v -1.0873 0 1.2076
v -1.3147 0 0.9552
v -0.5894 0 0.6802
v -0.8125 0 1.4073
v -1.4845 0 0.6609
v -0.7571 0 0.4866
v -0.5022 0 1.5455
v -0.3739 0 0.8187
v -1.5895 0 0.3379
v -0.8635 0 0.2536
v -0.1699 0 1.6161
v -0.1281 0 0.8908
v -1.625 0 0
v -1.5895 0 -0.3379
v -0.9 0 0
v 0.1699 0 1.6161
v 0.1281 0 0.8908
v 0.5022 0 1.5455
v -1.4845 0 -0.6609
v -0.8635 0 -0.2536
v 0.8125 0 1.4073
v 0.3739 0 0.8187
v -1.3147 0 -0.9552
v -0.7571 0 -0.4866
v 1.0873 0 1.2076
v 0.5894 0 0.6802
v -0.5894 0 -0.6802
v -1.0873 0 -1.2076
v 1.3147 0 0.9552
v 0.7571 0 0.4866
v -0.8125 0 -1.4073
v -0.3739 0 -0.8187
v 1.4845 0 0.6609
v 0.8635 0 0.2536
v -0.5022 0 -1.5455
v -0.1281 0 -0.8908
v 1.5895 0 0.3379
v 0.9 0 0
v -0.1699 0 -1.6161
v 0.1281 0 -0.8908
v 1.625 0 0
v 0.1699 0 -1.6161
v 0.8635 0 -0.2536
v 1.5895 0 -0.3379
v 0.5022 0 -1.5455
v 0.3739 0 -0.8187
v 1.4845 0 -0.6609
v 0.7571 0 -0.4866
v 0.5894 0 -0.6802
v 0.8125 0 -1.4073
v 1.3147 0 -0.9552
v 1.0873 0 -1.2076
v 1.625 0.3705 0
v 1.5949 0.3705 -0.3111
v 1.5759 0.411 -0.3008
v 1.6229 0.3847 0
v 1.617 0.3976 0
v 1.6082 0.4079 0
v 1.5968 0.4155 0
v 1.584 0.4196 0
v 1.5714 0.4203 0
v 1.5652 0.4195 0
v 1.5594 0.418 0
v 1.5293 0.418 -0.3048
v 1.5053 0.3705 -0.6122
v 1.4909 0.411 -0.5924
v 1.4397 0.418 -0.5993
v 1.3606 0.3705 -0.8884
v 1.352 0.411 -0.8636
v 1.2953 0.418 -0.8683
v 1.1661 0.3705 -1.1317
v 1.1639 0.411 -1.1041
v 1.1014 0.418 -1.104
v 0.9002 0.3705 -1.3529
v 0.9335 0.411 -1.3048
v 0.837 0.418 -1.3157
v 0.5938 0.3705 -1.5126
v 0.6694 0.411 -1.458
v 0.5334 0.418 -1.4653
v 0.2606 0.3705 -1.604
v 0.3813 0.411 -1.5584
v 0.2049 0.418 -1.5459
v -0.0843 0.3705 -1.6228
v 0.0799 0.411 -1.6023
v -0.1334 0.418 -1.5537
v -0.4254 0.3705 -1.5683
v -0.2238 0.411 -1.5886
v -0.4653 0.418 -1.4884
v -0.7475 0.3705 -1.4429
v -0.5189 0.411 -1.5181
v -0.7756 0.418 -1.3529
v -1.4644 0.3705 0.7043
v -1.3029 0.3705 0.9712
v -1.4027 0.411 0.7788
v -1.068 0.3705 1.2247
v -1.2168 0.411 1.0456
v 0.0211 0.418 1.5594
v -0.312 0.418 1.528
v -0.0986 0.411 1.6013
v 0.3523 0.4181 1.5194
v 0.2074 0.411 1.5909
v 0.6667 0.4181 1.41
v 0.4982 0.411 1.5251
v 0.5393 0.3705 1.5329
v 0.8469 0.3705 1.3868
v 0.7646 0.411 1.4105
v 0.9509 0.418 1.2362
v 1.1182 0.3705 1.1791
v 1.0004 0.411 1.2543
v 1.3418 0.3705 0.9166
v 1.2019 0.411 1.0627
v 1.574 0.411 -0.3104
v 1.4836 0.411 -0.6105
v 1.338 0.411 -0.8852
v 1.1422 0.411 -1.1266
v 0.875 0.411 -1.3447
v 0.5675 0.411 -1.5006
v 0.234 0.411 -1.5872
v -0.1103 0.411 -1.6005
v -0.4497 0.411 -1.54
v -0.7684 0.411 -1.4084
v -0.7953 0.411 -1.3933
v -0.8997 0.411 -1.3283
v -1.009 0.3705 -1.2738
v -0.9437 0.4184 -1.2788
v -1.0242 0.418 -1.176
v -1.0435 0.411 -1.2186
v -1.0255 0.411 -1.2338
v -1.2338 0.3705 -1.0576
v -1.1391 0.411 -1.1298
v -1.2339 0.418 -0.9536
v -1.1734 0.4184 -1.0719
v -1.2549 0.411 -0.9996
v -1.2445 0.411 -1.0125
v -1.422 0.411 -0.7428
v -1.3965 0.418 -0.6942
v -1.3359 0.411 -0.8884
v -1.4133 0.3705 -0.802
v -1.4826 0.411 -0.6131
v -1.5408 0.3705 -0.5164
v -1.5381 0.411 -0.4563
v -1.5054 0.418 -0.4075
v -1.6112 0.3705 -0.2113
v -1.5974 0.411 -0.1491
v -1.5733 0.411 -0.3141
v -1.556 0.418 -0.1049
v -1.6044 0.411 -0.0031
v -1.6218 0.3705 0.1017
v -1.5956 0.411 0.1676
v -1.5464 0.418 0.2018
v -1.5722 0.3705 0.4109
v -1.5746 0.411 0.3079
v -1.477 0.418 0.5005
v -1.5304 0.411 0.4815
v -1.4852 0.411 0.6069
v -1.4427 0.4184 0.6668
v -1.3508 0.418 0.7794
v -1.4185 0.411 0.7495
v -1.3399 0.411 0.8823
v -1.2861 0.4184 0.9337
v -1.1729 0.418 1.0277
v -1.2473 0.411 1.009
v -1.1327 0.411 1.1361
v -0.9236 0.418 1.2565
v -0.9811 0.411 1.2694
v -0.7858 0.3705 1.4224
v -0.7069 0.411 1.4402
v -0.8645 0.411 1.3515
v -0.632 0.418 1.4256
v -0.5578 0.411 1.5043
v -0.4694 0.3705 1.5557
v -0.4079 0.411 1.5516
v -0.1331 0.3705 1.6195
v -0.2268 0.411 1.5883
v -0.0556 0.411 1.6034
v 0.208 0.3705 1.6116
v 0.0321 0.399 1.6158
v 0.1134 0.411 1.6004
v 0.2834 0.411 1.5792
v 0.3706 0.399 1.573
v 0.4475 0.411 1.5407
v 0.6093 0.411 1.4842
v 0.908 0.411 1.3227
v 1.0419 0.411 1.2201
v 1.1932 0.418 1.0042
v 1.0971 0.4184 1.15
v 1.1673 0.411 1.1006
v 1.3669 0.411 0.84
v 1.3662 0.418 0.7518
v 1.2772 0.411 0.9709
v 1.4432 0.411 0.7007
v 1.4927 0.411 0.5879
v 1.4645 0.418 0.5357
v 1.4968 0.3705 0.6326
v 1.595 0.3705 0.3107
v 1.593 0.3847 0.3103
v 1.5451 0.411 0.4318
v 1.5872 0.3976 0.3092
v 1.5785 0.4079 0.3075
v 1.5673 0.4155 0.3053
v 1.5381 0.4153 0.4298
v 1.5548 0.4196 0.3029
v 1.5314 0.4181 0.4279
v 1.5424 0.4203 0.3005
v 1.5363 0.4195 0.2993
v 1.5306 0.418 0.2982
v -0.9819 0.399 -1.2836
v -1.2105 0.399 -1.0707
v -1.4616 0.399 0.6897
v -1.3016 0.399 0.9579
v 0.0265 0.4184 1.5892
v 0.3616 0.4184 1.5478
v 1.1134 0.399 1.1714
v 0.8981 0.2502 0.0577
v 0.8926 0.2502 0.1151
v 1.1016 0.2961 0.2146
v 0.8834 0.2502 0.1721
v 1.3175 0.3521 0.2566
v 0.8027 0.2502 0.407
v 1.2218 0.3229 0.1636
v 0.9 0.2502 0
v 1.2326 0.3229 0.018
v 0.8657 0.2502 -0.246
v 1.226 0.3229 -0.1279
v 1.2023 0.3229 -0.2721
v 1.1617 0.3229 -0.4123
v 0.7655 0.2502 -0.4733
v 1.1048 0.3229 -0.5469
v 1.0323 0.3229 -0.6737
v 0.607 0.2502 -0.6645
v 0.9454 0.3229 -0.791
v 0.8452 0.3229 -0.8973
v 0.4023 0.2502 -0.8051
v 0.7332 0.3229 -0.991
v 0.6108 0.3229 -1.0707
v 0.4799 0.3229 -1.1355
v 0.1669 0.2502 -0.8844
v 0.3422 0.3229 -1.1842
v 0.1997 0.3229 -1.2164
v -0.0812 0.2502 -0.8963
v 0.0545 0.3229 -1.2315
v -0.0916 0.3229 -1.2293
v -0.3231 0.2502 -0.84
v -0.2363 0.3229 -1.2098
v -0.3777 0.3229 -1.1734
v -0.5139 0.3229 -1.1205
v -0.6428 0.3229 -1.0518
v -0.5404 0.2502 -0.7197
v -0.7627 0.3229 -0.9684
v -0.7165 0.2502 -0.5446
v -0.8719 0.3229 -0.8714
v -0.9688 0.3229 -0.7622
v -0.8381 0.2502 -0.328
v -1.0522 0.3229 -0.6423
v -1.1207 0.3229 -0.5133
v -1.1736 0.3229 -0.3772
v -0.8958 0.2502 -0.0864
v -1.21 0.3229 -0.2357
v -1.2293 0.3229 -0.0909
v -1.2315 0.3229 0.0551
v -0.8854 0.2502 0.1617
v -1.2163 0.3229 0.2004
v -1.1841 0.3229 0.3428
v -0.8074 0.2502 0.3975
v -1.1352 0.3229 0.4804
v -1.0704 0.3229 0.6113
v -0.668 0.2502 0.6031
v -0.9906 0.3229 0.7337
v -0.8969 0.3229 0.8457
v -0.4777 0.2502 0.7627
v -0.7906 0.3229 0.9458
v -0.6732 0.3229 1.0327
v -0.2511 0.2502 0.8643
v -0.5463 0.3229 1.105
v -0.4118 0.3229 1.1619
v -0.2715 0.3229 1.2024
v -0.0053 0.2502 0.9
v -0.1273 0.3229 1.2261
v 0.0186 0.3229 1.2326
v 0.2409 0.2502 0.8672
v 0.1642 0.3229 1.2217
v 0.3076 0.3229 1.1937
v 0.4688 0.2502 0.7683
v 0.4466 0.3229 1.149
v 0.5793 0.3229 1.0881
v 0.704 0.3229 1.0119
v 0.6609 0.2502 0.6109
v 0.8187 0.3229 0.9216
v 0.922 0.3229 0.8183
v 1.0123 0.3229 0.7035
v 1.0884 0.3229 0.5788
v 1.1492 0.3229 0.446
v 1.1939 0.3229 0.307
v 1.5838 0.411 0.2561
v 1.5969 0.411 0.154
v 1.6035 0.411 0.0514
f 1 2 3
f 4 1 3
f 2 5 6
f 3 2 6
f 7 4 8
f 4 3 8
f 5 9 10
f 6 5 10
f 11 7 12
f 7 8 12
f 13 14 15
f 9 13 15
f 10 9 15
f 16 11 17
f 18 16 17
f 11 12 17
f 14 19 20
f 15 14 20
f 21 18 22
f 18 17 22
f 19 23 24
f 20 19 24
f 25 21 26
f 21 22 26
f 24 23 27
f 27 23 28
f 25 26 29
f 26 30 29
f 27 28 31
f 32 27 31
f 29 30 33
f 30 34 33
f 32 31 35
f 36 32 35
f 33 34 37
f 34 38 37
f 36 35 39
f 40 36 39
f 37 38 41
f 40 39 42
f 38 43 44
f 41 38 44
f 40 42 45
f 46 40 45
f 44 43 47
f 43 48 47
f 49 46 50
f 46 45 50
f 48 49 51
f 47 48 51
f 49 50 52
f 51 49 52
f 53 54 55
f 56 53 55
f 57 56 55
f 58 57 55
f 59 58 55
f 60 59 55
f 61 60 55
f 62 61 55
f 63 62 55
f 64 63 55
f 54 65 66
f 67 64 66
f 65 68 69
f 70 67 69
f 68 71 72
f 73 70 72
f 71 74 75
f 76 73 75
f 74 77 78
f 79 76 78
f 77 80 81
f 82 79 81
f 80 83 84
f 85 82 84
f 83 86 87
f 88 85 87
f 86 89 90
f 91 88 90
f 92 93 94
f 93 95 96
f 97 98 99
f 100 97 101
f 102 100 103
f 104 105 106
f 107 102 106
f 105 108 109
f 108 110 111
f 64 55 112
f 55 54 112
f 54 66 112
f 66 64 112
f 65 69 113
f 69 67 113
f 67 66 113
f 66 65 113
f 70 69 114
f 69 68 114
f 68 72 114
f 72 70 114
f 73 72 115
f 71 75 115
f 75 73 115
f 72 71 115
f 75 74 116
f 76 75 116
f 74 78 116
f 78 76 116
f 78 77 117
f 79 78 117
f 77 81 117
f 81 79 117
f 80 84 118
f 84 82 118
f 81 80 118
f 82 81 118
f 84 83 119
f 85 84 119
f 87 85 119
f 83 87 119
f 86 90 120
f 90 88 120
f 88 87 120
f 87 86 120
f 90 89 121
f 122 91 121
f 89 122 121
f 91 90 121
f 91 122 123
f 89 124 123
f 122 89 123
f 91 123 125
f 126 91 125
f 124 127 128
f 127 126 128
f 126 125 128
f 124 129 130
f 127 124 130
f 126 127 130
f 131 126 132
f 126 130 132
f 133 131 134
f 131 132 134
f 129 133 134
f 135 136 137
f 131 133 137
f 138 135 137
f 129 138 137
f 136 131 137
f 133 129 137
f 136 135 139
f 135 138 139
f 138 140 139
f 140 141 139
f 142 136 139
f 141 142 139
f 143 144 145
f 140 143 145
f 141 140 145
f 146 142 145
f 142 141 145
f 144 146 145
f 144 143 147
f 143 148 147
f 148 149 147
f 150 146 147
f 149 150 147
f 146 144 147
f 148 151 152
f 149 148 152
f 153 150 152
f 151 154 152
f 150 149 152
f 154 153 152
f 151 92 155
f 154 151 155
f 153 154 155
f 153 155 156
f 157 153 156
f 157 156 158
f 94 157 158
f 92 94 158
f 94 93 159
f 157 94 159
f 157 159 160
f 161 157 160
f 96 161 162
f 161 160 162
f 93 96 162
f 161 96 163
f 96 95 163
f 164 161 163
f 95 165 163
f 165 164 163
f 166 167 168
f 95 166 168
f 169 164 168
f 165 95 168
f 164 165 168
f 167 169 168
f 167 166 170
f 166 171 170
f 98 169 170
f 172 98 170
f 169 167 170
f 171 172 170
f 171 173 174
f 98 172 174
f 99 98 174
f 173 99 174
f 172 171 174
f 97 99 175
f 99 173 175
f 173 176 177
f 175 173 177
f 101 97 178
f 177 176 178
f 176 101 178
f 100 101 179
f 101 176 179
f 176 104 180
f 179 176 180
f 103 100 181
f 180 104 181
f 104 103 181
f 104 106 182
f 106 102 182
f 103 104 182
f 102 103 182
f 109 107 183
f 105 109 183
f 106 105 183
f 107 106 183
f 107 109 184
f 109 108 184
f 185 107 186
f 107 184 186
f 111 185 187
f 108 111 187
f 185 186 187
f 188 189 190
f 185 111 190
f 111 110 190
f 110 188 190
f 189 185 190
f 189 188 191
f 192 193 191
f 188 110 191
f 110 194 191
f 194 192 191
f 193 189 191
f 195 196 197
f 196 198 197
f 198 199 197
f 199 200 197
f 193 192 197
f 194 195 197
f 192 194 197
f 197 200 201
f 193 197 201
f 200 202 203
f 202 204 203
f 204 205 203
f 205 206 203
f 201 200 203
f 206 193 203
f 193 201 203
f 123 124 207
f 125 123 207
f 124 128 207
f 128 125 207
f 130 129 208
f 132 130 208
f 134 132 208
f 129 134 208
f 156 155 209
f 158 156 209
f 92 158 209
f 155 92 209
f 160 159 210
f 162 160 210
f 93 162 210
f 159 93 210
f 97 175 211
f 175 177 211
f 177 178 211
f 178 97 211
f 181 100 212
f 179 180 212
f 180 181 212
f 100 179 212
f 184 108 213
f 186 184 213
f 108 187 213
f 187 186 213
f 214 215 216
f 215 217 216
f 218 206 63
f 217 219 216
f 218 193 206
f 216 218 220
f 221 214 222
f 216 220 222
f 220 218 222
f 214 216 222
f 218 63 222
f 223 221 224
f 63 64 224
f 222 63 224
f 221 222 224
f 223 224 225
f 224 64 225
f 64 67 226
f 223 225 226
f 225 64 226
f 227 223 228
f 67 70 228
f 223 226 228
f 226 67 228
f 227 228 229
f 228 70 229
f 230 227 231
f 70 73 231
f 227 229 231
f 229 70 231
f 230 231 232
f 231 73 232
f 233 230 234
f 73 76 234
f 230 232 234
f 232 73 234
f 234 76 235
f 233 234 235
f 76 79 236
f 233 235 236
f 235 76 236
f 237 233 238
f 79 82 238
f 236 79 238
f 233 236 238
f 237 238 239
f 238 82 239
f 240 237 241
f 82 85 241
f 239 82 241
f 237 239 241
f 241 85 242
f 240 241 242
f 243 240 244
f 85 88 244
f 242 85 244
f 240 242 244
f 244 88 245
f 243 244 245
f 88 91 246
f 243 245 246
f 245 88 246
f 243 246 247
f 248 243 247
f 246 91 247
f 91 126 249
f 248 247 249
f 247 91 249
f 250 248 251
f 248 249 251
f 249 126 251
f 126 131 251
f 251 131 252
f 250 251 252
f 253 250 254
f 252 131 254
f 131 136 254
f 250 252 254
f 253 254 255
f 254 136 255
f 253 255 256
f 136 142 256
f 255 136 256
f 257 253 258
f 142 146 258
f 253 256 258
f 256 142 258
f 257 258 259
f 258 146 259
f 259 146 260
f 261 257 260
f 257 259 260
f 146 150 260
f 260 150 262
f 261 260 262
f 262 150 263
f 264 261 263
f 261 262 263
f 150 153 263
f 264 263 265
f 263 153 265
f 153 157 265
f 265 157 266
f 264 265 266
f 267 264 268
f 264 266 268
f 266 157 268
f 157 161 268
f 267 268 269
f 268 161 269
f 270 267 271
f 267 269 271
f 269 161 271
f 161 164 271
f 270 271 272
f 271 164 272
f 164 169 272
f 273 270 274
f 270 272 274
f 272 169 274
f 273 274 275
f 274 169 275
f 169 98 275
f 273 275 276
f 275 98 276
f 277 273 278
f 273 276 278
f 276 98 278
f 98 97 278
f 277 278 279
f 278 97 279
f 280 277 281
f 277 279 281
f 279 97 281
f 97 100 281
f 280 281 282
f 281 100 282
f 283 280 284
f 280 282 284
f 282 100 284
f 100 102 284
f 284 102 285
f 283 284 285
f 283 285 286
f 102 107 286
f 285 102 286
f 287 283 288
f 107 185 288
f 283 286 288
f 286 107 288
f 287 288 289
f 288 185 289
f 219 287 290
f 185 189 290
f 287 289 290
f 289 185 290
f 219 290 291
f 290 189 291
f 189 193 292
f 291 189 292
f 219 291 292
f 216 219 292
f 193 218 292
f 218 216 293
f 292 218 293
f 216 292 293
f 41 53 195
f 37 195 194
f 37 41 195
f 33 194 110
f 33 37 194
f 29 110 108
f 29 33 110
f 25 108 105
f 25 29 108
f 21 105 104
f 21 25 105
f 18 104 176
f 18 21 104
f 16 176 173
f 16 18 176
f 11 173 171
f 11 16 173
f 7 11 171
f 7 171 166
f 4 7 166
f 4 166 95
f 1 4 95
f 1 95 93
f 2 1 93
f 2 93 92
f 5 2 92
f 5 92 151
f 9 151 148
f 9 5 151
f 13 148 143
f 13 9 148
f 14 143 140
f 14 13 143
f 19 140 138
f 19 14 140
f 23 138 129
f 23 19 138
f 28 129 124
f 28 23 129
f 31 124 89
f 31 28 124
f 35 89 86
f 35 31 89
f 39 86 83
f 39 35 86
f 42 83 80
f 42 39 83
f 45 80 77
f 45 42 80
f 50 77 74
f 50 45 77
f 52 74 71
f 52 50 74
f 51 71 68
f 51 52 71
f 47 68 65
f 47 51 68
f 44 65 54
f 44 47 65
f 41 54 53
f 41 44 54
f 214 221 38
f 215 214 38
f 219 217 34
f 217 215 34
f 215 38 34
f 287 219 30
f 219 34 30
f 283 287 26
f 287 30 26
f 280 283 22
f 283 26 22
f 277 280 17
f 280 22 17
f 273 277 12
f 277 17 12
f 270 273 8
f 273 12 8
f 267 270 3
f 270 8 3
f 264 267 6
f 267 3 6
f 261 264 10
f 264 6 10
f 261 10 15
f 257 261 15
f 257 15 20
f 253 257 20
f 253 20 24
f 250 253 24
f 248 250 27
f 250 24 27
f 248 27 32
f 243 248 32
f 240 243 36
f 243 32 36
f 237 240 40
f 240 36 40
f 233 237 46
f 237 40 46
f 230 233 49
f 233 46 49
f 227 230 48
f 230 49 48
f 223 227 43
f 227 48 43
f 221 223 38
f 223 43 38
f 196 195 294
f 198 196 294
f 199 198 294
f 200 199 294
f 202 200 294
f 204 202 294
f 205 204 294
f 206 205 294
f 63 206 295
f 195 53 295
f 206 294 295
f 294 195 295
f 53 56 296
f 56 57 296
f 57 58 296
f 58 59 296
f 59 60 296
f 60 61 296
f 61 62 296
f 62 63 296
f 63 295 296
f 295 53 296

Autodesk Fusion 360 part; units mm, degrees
sketch "Sketch1" plane through (0, 0, 0) normal (0, 1, 0) x (1, 0, 0)
  circle A0 centre (0, 0) radius 1.625
  dimension "d1" = 3.25
extrude "Extrude1" add sketch "Sketch1" along normal blind 0.44
ref_plane "WorkPlane1" through (-0.3108, 0.0895, 1.595) normal (-0.1912, 0, 0.9815) x (-0.9815, 0, -0.1912)
ref_plane "WorkPlane2" through (0, 0.0895, 0) normal (-0.1912, 0, 0.9815) x (-0.9815, 0, -0.1912)
sketch "Sketch2" plane through (0, 0.0895, 0) normal (-0.1912, 0, 0.9815) x (-0.9815, 0, -0.1912)
  arc A0 (1.625, -0.3505) -> (-1.625, -0.3505) centre (0, -5.0791) ccw
  line L0 (-1.625, -0.3505) -> (1.625, -0.3505)
  line L1 (0, -3.3) -> (0, -2.7)
  line L2 (1.625, -0.3505) -> (-1.625, -0.3505)
  line L3 (0, -0.0791) -> (0, -0.3505)
  dimension "d6" = 5
revolve "Revolve1" cut sketch "Sketch2" angle 360 about axis through (0, 1.75, 0) along (0, 1, 0) contours A0 L0 L2 L3 picked at (-0.1835, -0.1797)
sketch "Sketch3" plane through (0, 0, 0) normal (0, -1, 0) x (1, 0, 0)
  circle A0 centre (0, 0) radius 1.625
  circle A1 centre (0, 0) radius 0.9
  dimension "d8" = 1.8
extrude "Extrude2" cut sketch "Sketch3" against normal through all contours A1
fillet "Fillet1" radius 0.05 1 edges at (-1.515, 0.44, 0.5876)
